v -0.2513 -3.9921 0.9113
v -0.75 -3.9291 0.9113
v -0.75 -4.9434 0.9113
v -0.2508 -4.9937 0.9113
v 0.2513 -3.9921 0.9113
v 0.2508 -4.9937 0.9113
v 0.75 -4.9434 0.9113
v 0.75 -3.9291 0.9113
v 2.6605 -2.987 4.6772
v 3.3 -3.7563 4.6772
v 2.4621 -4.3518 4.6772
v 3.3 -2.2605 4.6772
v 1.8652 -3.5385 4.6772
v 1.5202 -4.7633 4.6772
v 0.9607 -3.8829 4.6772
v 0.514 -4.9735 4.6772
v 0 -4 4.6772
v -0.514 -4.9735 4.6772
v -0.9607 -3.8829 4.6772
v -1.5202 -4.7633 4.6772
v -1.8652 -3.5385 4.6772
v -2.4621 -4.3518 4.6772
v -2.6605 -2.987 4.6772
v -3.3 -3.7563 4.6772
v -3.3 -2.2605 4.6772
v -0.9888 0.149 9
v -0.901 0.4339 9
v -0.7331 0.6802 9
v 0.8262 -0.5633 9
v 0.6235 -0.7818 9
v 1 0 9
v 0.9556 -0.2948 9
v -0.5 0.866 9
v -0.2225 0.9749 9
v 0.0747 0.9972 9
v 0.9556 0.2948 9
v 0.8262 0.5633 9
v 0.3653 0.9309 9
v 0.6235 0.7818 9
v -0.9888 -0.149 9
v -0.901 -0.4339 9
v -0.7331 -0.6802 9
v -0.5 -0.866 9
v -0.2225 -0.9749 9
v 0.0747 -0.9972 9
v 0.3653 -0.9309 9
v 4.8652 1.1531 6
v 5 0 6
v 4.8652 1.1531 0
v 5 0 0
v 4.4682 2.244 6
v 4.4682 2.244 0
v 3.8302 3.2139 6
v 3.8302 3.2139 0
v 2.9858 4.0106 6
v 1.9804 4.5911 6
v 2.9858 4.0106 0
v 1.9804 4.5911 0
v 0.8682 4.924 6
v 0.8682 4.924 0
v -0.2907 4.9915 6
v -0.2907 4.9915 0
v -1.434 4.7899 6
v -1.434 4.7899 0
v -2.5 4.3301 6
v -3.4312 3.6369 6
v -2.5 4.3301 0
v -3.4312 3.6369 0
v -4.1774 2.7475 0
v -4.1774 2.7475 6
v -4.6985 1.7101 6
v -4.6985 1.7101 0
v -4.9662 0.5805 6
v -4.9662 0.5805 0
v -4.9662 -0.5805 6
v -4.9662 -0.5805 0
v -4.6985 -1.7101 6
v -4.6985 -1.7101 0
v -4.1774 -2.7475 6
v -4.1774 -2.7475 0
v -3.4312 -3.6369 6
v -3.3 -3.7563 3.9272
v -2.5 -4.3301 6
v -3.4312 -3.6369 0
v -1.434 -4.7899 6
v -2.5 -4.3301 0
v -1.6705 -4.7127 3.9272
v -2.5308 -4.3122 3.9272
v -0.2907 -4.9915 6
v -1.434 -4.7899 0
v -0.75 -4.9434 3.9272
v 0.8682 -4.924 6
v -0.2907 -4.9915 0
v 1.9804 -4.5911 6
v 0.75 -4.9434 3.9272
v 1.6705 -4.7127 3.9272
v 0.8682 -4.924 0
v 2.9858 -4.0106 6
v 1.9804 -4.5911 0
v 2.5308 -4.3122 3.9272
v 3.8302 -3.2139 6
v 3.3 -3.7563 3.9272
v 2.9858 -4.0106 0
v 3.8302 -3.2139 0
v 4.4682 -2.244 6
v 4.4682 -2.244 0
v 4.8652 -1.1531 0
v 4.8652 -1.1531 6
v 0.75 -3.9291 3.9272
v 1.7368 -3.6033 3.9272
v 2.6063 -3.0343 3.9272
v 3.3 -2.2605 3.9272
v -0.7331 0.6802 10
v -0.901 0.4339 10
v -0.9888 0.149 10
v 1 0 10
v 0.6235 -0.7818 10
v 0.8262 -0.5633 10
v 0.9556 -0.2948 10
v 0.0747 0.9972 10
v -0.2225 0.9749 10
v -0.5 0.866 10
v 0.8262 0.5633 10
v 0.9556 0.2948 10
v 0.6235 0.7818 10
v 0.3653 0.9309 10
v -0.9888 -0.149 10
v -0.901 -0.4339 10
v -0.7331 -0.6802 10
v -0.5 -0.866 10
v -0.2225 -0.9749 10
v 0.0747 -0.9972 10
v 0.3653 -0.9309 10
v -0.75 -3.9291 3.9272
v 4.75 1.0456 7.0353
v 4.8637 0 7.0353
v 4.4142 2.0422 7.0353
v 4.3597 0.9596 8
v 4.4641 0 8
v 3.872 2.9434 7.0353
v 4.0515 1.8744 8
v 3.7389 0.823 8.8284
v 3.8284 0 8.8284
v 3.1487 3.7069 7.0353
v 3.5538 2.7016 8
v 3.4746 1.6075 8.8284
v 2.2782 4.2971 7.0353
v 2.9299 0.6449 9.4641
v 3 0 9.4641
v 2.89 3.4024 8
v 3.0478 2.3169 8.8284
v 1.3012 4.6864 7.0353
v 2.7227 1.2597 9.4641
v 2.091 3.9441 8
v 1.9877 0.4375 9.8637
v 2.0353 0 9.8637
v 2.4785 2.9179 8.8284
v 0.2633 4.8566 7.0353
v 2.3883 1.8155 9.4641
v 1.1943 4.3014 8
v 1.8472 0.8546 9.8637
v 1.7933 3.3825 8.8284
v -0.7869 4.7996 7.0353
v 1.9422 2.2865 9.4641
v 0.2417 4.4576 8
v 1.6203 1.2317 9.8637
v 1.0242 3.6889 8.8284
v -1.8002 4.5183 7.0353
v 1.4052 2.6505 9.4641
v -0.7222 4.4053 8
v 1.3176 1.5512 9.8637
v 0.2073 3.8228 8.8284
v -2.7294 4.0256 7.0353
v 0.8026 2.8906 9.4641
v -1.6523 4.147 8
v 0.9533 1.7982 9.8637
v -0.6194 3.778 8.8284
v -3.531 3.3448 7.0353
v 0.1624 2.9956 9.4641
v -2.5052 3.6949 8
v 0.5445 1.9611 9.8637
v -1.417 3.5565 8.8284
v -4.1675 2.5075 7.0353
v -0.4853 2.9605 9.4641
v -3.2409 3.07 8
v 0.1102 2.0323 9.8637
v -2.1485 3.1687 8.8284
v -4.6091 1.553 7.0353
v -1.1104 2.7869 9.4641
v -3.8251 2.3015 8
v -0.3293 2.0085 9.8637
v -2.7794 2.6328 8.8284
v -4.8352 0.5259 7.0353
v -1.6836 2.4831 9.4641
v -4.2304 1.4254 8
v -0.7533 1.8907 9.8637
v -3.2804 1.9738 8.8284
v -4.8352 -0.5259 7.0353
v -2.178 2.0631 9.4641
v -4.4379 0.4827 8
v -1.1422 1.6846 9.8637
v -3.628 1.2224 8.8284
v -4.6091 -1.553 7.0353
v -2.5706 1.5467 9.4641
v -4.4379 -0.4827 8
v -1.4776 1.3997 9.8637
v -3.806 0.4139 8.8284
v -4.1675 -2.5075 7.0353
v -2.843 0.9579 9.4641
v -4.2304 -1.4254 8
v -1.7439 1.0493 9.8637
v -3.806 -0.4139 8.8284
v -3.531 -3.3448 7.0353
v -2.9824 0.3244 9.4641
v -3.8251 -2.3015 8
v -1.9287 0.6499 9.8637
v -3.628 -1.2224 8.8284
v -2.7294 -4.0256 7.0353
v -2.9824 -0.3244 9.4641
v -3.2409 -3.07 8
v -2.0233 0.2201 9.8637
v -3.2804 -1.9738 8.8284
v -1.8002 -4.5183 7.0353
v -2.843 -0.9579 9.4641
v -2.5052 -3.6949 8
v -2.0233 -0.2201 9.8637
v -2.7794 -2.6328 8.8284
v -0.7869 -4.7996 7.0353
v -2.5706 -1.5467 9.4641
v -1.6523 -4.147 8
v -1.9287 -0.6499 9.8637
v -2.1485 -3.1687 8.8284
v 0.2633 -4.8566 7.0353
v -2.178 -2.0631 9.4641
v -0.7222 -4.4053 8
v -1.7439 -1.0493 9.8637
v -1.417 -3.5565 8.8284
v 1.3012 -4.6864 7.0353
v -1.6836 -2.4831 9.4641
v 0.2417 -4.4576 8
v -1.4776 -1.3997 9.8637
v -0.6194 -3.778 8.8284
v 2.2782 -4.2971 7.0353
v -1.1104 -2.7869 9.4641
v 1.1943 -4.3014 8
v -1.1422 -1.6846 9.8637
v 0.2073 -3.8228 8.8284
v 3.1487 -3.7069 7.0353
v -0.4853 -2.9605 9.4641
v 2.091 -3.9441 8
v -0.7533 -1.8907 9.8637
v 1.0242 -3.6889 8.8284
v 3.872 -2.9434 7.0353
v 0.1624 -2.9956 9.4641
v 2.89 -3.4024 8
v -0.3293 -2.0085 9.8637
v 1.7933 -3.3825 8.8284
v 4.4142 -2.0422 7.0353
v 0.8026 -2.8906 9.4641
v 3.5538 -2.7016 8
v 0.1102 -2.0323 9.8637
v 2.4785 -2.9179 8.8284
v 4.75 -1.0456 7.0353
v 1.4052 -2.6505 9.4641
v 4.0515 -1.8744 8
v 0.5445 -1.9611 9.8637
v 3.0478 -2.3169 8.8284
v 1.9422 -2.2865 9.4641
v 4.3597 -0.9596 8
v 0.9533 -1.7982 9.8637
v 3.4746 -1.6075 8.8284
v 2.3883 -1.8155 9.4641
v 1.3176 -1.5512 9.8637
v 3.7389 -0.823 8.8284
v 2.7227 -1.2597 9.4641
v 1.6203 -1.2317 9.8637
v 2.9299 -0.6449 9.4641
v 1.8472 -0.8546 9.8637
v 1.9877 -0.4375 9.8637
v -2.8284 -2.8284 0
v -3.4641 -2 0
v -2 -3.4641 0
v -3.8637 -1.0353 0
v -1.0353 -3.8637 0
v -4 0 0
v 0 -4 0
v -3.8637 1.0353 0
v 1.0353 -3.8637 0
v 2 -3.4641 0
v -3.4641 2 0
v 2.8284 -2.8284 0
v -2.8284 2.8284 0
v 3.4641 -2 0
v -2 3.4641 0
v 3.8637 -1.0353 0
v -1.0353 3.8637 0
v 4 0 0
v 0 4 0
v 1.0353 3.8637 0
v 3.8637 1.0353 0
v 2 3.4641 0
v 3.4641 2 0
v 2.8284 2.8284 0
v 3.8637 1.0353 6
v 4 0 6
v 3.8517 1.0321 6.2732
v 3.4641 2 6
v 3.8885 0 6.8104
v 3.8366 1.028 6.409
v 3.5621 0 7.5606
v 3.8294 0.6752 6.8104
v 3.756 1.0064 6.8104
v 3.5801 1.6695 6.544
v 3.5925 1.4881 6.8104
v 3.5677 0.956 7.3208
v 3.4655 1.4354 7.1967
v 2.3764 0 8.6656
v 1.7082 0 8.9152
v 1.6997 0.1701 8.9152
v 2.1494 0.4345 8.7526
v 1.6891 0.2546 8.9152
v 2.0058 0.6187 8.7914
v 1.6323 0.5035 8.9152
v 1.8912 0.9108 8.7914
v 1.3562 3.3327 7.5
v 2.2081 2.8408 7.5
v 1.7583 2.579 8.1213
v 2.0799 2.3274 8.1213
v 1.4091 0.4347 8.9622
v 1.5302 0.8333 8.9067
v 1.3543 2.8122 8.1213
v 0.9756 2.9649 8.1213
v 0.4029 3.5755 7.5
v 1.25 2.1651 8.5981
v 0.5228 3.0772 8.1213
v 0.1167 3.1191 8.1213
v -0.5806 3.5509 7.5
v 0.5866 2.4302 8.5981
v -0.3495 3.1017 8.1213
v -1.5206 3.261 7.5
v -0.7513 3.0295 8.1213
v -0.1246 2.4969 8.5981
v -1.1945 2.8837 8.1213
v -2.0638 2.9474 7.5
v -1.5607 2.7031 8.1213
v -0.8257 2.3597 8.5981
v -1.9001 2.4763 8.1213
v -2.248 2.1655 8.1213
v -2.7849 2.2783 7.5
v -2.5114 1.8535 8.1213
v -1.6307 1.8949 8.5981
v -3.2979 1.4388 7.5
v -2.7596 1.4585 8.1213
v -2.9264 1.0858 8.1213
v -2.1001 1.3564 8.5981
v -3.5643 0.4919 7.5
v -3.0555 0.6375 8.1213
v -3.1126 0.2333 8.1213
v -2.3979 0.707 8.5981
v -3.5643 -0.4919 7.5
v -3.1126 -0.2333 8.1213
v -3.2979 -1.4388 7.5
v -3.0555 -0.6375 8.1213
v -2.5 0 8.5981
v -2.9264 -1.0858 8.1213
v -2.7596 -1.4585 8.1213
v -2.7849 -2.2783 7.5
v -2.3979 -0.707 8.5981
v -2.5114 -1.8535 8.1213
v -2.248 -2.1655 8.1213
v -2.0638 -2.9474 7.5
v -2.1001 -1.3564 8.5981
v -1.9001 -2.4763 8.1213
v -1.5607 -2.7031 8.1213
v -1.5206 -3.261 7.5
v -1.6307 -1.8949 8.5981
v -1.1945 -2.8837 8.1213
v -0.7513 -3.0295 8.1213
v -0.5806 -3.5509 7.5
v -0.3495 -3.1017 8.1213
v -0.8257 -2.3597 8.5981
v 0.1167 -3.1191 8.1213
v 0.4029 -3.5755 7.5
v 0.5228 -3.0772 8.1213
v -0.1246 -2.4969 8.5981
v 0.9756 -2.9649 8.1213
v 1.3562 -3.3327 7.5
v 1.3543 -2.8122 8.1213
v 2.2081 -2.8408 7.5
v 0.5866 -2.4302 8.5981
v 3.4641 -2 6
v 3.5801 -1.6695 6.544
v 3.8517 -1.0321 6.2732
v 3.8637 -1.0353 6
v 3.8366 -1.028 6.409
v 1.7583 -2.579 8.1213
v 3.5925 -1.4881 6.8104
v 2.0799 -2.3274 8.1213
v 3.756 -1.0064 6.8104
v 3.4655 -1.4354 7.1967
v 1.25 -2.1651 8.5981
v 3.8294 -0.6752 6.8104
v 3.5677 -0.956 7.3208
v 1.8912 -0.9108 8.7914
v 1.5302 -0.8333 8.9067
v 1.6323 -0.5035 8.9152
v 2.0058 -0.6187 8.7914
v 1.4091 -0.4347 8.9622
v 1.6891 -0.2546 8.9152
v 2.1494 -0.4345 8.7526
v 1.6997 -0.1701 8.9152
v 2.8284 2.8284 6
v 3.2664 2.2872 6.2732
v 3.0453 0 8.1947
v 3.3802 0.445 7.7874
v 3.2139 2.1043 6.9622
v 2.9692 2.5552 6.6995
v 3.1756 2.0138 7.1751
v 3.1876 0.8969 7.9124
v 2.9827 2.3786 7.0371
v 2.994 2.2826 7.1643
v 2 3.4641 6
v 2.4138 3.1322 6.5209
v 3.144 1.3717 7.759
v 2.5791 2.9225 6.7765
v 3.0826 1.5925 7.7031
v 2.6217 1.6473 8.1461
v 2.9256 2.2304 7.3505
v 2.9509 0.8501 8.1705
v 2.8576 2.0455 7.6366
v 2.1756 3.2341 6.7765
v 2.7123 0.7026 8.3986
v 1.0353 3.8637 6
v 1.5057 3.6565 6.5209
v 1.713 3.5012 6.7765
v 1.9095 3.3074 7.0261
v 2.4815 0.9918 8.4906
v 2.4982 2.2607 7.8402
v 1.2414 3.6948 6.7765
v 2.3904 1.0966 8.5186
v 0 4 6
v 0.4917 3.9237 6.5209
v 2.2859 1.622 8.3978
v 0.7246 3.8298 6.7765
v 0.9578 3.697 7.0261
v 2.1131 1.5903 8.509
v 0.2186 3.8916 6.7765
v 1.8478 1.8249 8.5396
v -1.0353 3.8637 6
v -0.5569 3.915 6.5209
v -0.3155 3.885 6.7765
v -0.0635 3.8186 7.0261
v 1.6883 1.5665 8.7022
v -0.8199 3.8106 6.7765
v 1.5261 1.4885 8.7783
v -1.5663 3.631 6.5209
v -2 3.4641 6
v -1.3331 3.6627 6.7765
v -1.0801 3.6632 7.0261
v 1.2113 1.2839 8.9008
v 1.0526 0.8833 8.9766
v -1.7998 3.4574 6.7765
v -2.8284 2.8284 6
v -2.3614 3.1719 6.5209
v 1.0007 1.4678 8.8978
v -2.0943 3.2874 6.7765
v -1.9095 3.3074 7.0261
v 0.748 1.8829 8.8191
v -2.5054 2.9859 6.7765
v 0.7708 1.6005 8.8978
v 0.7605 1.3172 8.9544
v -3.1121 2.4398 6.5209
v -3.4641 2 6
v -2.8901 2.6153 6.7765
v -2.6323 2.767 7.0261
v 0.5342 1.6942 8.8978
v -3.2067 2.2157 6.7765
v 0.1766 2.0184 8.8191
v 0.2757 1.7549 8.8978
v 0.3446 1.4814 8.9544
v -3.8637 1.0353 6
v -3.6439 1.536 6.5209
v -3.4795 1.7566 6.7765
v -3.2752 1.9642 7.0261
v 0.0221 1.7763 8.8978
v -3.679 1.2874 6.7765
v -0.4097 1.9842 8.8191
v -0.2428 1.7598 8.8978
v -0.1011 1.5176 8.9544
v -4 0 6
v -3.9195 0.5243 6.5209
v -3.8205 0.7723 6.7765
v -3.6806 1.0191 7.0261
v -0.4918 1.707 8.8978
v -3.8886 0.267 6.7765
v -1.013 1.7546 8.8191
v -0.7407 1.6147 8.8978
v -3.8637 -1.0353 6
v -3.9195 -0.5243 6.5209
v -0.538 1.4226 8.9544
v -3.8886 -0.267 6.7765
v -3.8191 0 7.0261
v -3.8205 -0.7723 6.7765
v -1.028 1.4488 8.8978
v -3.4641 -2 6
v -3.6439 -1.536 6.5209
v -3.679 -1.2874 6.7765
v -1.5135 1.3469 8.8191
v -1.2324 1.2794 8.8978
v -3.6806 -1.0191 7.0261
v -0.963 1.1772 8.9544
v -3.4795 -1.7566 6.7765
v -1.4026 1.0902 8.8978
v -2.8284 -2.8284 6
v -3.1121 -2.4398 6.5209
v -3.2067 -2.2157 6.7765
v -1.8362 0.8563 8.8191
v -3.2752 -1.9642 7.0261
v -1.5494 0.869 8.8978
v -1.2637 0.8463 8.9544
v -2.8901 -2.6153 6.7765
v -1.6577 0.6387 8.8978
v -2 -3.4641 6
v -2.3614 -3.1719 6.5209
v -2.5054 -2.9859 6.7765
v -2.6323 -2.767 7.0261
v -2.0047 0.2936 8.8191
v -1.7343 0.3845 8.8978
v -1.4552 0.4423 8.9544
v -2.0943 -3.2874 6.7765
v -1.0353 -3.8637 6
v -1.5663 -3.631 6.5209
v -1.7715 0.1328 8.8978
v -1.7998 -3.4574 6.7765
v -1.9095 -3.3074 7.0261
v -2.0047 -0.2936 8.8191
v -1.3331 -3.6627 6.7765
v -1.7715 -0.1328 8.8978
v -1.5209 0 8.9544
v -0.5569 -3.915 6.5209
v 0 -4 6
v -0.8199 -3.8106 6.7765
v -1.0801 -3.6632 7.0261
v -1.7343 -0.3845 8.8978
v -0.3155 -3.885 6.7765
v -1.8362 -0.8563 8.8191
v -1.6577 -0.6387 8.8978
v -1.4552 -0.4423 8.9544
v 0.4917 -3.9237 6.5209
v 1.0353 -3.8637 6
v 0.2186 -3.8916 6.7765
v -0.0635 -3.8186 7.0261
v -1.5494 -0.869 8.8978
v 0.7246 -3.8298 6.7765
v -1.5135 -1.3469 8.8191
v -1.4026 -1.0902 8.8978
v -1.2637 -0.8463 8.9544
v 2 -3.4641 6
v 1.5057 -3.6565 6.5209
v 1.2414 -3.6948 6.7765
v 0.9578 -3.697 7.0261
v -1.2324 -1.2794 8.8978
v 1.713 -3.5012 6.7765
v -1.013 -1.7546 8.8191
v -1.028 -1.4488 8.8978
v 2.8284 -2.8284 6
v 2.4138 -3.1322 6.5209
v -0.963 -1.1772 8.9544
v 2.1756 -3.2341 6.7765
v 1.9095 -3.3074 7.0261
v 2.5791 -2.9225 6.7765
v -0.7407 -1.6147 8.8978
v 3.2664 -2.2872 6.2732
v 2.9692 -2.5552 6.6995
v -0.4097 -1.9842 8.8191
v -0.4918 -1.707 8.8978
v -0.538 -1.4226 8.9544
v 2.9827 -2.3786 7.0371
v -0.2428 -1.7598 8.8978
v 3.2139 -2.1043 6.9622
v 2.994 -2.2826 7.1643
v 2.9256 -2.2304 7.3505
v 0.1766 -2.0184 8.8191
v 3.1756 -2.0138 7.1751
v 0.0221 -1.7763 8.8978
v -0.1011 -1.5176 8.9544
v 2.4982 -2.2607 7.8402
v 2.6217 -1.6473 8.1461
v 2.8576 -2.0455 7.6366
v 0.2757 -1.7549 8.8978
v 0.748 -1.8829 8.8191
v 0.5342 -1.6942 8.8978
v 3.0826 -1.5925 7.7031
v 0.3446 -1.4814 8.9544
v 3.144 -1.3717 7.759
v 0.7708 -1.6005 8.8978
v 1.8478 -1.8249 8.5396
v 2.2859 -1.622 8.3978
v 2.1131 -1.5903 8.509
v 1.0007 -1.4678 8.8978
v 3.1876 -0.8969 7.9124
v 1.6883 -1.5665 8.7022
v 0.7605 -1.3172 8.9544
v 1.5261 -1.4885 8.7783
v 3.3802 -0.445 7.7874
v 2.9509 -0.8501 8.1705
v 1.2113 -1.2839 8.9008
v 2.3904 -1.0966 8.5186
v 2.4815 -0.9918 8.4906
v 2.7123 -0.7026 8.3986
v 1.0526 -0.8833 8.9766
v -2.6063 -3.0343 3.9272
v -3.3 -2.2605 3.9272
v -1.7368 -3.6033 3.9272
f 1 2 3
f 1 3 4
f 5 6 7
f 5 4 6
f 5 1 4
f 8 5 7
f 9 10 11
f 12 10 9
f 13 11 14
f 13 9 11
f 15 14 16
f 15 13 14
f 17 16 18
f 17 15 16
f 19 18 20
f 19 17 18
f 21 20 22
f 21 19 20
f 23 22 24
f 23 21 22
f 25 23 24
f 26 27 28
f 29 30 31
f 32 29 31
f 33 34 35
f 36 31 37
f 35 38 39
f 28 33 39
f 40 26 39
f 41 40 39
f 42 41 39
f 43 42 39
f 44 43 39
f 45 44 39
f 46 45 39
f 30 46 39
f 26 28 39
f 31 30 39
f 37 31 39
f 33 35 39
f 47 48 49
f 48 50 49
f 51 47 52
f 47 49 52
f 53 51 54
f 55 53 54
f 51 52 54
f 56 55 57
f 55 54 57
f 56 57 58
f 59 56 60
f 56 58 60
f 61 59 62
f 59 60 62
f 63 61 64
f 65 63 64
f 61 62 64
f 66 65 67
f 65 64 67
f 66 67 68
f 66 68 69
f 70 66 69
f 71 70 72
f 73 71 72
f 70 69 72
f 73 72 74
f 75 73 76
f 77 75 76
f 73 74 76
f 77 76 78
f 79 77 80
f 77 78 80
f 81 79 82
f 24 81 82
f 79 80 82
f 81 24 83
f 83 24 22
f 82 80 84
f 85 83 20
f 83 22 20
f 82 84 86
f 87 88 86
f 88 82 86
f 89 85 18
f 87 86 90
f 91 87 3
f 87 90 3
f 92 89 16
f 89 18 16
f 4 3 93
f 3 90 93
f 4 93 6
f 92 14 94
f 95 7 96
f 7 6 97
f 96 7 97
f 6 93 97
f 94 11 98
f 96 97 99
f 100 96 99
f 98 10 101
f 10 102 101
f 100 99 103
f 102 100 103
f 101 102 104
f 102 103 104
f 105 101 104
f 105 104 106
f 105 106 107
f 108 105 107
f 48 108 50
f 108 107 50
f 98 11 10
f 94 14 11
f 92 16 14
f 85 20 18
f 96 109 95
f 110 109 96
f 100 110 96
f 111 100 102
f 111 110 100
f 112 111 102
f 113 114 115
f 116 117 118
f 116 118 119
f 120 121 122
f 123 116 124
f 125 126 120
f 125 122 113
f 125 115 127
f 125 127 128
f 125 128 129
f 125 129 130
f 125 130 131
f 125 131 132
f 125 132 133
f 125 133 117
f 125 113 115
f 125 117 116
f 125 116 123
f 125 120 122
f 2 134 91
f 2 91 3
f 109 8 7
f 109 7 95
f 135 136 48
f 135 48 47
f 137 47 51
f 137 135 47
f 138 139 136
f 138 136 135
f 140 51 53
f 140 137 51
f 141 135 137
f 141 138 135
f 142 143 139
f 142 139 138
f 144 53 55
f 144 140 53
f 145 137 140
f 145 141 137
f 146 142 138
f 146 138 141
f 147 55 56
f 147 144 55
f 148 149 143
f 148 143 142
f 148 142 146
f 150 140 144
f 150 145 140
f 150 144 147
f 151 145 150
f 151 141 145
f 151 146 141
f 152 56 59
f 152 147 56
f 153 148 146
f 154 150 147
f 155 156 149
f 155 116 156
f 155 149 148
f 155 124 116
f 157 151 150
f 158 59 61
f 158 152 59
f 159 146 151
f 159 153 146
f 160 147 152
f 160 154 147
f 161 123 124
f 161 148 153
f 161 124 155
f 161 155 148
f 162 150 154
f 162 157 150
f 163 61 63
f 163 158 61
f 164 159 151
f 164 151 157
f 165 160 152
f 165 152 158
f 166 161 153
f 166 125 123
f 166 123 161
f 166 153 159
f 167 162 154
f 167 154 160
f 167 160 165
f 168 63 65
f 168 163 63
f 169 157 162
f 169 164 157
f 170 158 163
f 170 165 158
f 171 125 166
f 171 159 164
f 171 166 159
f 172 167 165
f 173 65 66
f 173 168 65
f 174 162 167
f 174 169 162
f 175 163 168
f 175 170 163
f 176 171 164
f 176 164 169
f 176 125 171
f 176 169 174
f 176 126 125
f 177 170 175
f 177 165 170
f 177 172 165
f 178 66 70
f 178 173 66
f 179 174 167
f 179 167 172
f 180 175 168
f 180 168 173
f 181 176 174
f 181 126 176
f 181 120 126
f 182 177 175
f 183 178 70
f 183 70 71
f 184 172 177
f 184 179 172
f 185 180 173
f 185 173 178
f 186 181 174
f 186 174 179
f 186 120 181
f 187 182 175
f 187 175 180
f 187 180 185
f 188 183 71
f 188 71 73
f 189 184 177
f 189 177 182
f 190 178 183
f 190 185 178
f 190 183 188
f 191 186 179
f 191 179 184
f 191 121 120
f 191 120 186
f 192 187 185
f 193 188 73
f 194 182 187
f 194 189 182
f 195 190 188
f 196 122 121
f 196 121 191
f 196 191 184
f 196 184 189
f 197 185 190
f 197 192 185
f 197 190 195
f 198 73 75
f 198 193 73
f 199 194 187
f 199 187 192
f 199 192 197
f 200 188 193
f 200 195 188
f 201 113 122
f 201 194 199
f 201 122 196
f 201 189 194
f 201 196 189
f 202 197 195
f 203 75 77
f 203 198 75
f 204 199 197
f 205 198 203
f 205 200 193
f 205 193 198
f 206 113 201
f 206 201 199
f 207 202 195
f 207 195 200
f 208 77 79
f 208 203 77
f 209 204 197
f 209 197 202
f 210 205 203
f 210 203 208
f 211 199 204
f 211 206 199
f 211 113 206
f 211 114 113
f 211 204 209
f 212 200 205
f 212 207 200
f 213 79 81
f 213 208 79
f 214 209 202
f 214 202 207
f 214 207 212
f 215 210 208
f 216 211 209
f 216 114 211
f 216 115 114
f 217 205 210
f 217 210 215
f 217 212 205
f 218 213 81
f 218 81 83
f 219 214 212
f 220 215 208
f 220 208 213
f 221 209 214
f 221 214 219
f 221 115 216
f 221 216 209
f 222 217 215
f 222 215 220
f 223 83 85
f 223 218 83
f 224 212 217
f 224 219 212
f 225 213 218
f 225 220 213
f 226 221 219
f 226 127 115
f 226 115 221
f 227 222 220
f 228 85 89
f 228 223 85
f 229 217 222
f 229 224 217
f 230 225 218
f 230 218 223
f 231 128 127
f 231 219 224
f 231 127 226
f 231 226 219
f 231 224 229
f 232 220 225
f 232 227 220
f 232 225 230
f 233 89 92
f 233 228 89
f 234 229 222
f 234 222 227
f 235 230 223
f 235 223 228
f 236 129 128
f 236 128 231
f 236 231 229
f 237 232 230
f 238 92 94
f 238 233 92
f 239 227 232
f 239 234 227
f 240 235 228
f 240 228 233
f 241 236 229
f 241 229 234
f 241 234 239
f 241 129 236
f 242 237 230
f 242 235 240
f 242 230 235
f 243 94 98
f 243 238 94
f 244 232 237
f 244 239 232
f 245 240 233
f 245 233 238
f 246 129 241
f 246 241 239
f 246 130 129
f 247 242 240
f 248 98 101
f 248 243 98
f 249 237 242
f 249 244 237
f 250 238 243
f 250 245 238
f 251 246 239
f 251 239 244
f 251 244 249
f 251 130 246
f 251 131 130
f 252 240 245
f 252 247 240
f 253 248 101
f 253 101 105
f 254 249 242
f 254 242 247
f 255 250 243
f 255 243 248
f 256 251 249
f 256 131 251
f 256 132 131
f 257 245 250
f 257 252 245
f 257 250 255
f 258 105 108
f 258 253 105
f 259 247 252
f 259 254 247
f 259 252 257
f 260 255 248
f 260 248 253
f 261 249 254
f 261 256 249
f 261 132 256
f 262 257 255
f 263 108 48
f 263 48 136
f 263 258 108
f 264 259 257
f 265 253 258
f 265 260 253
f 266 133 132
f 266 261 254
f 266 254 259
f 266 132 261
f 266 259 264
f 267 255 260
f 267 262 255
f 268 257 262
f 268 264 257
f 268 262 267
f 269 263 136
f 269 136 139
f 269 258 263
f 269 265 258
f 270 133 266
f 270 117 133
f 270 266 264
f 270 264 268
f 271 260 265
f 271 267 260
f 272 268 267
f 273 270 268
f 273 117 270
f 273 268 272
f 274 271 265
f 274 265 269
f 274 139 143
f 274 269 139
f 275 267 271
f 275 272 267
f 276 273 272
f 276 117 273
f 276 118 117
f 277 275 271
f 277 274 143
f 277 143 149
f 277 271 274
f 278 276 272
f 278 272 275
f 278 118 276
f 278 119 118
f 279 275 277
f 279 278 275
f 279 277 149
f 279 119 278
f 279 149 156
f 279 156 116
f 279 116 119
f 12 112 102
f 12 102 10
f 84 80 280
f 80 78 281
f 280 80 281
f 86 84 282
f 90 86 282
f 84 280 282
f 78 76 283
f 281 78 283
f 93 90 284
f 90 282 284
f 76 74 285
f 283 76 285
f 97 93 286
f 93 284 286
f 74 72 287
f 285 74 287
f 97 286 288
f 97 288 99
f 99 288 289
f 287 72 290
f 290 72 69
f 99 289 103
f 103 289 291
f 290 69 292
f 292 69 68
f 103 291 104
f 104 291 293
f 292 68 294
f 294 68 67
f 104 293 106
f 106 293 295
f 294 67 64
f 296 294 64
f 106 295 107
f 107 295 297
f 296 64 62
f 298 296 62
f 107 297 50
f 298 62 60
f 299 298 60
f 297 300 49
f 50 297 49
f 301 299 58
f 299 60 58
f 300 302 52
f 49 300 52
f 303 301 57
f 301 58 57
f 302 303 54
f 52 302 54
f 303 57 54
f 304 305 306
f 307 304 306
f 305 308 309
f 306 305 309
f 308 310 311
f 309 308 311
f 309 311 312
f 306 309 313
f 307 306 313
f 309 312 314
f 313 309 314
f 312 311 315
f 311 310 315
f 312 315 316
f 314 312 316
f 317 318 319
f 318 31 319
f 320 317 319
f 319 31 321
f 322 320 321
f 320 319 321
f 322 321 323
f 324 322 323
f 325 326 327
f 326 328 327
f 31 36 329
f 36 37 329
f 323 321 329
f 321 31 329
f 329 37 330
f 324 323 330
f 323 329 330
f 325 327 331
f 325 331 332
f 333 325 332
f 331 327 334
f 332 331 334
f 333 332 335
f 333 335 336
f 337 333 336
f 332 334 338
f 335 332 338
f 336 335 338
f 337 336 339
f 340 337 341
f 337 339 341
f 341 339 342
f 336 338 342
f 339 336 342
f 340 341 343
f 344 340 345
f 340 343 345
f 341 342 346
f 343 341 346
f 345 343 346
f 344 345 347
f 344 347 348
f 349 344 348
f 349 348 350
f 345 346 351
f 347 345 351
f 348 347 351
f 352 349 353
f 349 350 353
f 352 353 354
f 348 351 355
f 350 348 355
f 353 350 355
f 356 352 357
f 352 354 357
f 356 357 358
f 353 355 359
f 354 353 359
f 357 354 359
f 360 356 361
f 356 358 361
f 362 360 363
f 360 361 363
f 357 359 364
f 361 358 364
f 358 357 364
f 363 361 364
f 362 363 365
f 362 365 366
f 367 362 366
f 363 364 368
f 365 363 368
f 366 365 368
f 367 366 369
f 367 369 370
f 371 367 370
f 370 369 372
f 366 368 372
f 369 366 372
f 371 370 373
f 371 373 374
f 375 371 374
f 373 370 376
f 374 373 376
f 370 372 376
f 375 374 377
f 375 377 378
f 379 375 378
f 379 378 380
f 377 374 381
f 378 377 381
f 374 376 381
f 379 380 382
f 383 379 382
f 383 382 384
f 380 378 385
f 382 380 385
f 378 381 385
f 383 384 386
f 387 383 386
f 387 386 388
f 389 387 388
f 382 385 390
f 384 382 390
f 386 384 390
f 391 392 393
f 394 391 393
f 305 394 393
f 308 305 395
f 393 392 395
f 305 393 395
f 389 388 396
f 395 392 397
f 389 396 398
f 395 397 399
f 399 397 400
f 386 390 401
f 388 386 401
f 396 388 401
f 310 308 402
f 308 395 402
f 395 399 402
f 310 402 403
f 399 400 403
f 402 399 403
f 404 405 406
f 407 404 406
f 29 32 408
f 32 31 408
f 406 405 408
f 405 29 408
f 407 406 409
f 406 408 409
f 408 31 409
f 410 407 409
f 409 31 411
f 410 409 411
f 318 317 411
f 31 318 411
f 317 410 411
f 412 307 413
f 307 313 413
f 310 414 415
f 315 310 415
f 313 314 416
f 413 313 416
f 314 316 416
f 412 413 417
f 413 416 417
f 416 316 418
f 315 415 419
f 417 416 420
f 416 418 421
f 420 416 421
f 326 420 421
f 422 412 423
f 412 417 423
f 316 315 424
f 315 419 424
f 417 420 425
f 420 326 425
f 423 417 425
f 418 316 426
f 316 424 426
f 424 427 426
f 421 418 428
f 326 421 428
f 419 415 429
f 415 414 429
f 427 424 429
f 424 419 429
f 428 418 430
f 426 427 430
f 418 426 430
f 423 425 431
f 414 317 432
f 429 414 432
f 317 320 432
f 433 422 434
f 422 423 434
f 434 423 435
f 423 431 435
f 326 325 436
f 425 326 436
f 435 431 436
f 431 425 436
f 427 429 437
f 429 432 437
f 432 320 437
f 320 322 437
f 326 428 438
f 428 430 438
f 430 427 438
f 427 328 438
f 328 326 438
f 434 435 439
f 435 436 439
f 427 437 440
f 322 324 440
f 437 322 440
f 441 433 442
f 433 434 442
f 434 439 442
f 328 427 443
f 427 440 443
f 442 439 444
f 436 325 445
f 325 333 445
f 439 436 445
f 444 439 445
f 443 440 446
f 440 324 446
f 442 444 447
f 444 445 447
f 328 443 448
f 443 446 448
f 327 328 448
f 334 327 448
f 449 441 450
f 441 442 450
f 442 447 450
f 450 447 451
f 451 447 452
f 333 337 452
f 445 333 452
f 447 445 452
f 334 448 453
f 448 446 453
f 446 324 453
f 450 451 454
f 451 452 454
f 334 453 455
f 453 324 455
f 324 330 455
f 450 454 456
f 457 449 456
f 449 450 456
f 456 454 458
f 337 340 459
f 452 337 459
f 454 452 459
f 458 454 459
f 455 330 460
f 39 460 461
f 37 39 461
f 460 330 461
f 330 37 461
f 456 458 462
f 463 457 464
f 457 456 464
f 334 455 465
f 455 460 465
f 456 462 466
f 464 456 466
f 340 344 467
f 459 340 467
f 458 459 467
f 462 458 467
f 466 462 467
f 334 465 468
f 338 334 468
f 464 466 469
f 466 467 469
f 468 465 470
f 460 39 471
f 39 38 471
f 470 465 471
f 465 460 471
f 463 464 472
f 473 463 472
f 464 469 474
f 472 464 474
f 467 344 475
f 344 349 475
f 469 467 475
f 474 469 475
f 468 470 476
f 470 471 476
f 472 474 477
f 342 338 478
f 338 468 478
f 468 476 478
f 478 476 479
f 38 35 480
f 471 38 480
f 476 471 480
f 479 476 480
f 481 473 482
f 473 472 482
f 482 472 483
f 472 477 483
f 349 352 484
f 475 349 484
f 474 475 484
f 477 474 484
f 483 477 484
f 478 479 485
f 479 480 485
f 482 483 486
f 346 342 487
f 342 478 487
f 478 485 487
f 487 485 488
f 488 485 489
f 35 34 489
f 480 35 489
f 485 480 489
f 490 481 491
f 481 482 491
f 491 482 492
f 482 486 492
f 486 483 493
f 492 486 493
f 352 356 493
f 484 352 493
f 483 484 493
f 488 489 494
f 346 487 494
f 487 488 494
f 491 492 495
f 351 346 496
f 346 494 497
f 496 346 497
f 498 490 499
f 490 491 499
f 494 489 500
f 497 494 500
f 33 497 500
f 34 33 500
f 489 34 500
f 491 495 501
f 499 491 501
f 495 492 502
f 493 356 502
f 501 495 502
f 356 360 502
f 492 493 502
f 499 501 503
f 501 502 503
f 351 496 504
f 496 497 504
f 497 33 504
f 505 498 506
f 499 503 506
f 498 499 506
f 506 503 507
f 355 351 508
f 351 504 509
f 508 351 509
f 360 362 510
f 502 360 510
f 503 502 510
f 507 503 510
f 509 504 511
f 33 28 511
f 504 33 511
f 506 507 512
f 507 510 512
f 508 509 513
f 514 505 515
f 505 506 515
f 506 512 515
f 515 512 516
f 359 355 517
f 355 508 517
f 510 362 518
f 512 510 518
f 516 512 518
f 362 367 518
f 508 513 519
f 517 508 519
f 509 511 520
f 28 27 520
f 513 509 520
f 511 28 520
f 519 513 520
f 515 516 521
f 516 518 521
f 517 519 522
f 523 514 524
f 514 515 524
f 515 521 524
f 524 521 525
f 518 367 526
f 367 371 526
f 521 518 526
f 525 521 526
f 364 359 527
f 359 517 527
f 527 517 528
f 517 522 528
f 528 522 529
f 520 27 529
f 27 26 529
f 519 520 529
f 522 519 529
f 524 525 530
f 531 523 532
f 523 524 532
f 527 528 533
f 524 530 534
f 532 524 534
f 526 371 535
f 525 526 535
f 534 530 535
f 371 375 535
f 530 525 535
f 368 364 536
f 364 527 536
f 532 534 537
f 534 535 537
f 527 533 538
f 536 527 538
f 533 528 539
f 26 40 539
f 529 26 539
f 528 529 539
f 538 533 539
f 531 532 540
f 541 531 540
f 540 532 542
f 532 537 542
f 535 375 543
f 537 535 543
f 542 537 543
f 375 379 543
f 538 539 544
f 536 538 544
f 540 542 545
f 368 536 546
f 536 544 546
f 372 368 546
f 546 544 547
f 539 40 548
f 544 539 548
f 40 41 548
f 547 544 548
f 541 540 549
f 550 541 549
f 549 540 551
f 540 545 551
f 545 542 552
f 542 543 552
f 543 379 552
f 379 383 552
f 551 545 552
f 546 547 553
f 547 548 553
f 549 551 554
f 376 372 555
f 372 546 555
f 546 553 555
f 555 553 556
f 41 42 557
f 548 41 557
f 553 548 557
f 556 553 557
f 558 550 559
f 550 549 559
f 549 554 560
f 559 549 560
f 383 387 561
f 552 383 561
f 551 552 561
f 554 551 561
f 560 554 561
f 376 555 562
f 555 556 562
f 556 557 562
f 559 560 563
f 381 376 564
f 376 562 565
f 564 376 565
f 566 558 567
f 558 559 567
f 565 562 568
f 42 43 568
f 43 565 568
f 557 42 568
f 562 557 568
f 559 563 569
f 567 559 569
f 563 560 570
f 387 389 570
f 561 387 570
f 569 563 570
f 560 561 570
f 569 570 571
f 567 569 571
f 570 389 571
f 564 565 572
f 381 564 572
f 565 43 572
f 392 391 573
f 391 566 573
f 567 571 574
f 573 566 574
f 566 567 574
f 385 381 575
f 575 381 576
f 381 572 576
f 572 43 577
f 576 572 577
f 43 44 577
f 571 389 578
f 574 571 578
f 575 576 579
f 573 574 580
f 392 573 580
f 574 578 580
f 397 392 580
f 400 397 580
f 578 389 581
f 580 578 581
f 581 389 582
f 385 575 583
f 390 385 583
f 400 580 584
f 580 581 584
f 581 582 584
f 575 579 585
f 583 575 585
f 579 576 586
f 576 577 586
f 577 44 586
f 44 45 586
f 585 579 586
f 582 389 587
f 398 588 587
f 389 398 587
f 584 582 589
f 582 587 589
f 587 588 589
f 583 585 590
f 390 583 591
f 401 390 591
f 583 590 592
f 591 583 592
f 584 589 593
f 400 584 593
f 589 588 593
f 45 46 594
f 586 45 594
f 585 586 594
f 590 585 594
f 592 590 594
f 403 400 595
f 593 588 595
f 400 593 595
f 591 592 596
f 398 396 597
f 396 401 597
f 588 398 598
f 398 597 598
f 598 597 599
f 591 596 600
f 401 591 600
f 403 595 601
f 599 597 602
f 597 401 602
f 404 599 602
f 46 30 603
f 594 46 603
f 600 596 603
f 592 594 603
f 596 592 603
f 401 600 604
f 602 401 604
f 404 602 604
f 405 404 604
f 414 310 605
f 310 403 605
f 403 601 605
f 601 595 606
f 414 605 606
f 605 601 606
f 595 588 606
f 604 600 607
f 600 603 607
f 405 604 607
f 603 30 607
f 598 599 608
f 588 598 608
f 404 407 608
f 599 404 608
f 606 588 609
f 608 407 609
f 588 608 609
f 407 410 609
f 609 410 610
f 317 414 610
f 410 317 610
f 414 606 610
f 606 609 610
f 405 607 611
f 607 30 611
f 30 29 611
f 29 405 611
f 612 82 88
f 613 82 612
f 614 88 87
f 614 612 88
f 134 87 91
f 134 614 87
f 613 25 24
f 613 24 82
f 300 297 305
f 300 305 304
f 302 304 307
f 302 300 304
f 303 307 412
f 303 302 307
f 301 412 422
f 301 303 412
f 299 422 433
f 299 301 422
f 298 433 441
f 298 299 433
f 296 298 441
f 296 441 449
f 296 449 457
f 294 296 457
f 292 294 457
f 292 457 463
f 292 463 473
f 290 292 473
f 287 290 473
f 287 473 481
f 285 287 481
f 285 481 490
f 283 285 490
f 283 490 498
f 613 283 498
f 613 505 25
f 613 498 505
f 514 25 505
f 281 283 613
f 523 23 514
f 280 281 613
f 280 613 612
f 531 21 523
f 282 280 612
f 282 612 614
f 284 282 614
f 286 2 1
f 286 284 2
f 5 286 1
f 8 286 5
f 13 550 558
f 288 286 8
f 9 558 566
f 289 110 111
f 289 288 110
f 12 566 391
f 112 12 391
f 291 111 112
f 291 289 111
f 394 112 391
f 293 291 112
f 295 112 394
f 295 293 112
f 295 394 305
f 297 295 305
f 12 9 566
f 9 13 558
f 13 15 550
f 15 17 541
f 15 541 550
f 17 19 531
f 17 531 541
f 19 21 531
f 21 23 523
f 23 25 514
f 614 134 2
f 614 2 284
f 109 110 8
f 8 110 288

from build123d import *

# Parameters (mm, degrees)
F0_R     = 5
F1_DEPTH = 10
F2_R     = 4
F3_T     = -1
F5_DEPTH = 25


with BuildPart() as f1:
    # F0 (on Top) → F1 (new body)
    with BuildSketch(Plane.XY):
        Circle(F0_R)
    extrude(amount=F1_DEPTH)

    # F2
    f2_edges = [f1.edges().sort_by_distance(p)[0] for p in [
        (-5, 0, 10),
    ]]
    fillet(f2_edges, radius=F2_R)

    # F3
    f3_openings = [f1.faces().sort_by_distance(p)[0] for p in [
        (0, 0, 0),
    ]]
    offset(amount=F3_T, openings=f3_openings)

    # F4 (on Front) → F5 (cut)
    with BuildSketch(Plane.XZ):
        Polygon((3.3, 4.67722), (0, 4.67722), (-3.3, 4.67722), (-3.3, 3.92722), (-0.75, 3.92722), (-0.75, 0.911284), (0.75, 0.911284), (0.75, 3.92722), (3.3, 3.92722), align=None)
    extrude(amount=F5_DEPTH, mode=Mode.SUBTRACT)


solid = f1.part
